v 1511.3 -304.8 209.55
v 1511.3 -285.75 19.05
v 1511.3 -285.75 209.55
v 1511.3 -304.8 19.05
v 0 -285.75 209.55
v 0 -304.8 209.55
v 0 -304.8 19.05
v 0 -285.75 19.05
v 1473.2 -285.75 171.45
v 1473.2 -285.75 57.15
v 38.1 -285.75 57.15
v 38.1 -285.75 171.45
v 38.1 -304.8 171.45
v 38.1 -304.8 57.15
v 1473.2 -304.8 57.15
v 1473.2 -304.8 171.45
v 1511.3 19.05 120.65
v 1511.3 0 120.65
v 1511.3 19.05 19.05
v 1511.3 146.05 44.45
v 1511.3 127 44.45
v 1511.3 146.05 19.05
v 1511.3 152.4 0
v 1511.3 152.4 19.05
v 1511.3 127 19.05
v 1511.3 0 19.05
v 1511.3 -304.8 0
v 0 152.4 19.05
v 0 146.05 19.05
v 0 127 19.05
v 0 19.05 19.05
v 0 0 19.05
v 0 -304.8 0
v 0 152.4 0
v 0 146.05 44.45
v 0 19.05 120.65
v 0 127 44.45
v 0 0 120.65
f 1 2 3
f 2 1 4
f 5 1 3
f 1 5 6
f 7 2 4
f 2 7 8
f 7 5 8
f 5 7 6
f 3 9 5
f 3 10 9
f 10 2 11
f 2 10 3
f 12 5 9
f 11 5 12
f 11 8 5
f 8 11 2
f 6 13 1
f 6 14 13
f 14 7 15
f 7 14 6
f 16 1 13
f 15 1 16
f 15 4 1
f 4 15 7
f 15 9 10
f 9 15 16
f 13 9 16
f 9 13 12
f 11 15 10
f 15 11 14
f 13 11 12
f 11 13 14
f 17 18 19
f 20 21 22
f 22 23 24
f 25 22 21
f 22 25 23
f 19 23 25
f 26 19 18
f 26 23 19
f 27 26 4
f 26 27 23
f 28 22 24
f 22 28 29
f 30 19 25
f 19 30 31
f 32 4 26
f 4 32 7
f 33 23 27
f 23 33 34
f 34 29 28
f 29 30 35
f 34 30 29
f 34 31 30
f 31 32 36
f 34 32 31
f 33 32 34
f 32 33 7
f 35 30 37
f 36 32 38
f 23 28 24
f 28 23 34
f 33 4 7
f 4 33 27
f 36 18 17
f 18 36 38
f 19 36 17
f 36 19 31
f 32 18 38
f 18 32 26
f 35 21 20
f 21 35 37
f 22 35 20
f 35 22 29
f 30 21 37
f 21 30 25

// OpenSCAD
// file: ../lib/convert.scad
function inches(in) = in * 25.4;
function feet(ft) = inches(ft * 12);
// main file
use <../lib/convert.scad>

cabinet_unit_width = feet(4) + inches(11.5);
main_cabinets_height = inches(16);

module shelf() {
  color("#f2ba52")
    cube([cabinet_unit_width, feet(1.5), inches(0.75)]);
}

module spice_rack_wall() {
  color("#f2ba52")
    cube([cabinet_unit_width, inches(0.75), inches(4)]);
}

module spice_rack_lip() {
  color("#f2ba52")
    cube([cabinet_unit_width, inches(0.75), inches(1)]);
}

module cubby_front() {
  color("#f2ba52")
  difference() {
    cube([cabinet_unit_width, inches(0.75), inches(7.5)]);

    translate([inches(1.5), inches(-0.125), inches(1.5)])
      cube([cabinet_unit_width - inches(3), inches(1), inches(4.5)]);
  }
}

module upper_galley() {
  union() {
    translate([0, feet(-1), 0])
      shelf();
    translate([0, feet(-1), inches(0.75)])
      cubby_front();
    translate([0, 0, inches(0.75)])
      spice_rack_wall();
    translate([0, inches(5), inches(0.75)])
      spice_rack_lip();
  }
}

upper_galley();
